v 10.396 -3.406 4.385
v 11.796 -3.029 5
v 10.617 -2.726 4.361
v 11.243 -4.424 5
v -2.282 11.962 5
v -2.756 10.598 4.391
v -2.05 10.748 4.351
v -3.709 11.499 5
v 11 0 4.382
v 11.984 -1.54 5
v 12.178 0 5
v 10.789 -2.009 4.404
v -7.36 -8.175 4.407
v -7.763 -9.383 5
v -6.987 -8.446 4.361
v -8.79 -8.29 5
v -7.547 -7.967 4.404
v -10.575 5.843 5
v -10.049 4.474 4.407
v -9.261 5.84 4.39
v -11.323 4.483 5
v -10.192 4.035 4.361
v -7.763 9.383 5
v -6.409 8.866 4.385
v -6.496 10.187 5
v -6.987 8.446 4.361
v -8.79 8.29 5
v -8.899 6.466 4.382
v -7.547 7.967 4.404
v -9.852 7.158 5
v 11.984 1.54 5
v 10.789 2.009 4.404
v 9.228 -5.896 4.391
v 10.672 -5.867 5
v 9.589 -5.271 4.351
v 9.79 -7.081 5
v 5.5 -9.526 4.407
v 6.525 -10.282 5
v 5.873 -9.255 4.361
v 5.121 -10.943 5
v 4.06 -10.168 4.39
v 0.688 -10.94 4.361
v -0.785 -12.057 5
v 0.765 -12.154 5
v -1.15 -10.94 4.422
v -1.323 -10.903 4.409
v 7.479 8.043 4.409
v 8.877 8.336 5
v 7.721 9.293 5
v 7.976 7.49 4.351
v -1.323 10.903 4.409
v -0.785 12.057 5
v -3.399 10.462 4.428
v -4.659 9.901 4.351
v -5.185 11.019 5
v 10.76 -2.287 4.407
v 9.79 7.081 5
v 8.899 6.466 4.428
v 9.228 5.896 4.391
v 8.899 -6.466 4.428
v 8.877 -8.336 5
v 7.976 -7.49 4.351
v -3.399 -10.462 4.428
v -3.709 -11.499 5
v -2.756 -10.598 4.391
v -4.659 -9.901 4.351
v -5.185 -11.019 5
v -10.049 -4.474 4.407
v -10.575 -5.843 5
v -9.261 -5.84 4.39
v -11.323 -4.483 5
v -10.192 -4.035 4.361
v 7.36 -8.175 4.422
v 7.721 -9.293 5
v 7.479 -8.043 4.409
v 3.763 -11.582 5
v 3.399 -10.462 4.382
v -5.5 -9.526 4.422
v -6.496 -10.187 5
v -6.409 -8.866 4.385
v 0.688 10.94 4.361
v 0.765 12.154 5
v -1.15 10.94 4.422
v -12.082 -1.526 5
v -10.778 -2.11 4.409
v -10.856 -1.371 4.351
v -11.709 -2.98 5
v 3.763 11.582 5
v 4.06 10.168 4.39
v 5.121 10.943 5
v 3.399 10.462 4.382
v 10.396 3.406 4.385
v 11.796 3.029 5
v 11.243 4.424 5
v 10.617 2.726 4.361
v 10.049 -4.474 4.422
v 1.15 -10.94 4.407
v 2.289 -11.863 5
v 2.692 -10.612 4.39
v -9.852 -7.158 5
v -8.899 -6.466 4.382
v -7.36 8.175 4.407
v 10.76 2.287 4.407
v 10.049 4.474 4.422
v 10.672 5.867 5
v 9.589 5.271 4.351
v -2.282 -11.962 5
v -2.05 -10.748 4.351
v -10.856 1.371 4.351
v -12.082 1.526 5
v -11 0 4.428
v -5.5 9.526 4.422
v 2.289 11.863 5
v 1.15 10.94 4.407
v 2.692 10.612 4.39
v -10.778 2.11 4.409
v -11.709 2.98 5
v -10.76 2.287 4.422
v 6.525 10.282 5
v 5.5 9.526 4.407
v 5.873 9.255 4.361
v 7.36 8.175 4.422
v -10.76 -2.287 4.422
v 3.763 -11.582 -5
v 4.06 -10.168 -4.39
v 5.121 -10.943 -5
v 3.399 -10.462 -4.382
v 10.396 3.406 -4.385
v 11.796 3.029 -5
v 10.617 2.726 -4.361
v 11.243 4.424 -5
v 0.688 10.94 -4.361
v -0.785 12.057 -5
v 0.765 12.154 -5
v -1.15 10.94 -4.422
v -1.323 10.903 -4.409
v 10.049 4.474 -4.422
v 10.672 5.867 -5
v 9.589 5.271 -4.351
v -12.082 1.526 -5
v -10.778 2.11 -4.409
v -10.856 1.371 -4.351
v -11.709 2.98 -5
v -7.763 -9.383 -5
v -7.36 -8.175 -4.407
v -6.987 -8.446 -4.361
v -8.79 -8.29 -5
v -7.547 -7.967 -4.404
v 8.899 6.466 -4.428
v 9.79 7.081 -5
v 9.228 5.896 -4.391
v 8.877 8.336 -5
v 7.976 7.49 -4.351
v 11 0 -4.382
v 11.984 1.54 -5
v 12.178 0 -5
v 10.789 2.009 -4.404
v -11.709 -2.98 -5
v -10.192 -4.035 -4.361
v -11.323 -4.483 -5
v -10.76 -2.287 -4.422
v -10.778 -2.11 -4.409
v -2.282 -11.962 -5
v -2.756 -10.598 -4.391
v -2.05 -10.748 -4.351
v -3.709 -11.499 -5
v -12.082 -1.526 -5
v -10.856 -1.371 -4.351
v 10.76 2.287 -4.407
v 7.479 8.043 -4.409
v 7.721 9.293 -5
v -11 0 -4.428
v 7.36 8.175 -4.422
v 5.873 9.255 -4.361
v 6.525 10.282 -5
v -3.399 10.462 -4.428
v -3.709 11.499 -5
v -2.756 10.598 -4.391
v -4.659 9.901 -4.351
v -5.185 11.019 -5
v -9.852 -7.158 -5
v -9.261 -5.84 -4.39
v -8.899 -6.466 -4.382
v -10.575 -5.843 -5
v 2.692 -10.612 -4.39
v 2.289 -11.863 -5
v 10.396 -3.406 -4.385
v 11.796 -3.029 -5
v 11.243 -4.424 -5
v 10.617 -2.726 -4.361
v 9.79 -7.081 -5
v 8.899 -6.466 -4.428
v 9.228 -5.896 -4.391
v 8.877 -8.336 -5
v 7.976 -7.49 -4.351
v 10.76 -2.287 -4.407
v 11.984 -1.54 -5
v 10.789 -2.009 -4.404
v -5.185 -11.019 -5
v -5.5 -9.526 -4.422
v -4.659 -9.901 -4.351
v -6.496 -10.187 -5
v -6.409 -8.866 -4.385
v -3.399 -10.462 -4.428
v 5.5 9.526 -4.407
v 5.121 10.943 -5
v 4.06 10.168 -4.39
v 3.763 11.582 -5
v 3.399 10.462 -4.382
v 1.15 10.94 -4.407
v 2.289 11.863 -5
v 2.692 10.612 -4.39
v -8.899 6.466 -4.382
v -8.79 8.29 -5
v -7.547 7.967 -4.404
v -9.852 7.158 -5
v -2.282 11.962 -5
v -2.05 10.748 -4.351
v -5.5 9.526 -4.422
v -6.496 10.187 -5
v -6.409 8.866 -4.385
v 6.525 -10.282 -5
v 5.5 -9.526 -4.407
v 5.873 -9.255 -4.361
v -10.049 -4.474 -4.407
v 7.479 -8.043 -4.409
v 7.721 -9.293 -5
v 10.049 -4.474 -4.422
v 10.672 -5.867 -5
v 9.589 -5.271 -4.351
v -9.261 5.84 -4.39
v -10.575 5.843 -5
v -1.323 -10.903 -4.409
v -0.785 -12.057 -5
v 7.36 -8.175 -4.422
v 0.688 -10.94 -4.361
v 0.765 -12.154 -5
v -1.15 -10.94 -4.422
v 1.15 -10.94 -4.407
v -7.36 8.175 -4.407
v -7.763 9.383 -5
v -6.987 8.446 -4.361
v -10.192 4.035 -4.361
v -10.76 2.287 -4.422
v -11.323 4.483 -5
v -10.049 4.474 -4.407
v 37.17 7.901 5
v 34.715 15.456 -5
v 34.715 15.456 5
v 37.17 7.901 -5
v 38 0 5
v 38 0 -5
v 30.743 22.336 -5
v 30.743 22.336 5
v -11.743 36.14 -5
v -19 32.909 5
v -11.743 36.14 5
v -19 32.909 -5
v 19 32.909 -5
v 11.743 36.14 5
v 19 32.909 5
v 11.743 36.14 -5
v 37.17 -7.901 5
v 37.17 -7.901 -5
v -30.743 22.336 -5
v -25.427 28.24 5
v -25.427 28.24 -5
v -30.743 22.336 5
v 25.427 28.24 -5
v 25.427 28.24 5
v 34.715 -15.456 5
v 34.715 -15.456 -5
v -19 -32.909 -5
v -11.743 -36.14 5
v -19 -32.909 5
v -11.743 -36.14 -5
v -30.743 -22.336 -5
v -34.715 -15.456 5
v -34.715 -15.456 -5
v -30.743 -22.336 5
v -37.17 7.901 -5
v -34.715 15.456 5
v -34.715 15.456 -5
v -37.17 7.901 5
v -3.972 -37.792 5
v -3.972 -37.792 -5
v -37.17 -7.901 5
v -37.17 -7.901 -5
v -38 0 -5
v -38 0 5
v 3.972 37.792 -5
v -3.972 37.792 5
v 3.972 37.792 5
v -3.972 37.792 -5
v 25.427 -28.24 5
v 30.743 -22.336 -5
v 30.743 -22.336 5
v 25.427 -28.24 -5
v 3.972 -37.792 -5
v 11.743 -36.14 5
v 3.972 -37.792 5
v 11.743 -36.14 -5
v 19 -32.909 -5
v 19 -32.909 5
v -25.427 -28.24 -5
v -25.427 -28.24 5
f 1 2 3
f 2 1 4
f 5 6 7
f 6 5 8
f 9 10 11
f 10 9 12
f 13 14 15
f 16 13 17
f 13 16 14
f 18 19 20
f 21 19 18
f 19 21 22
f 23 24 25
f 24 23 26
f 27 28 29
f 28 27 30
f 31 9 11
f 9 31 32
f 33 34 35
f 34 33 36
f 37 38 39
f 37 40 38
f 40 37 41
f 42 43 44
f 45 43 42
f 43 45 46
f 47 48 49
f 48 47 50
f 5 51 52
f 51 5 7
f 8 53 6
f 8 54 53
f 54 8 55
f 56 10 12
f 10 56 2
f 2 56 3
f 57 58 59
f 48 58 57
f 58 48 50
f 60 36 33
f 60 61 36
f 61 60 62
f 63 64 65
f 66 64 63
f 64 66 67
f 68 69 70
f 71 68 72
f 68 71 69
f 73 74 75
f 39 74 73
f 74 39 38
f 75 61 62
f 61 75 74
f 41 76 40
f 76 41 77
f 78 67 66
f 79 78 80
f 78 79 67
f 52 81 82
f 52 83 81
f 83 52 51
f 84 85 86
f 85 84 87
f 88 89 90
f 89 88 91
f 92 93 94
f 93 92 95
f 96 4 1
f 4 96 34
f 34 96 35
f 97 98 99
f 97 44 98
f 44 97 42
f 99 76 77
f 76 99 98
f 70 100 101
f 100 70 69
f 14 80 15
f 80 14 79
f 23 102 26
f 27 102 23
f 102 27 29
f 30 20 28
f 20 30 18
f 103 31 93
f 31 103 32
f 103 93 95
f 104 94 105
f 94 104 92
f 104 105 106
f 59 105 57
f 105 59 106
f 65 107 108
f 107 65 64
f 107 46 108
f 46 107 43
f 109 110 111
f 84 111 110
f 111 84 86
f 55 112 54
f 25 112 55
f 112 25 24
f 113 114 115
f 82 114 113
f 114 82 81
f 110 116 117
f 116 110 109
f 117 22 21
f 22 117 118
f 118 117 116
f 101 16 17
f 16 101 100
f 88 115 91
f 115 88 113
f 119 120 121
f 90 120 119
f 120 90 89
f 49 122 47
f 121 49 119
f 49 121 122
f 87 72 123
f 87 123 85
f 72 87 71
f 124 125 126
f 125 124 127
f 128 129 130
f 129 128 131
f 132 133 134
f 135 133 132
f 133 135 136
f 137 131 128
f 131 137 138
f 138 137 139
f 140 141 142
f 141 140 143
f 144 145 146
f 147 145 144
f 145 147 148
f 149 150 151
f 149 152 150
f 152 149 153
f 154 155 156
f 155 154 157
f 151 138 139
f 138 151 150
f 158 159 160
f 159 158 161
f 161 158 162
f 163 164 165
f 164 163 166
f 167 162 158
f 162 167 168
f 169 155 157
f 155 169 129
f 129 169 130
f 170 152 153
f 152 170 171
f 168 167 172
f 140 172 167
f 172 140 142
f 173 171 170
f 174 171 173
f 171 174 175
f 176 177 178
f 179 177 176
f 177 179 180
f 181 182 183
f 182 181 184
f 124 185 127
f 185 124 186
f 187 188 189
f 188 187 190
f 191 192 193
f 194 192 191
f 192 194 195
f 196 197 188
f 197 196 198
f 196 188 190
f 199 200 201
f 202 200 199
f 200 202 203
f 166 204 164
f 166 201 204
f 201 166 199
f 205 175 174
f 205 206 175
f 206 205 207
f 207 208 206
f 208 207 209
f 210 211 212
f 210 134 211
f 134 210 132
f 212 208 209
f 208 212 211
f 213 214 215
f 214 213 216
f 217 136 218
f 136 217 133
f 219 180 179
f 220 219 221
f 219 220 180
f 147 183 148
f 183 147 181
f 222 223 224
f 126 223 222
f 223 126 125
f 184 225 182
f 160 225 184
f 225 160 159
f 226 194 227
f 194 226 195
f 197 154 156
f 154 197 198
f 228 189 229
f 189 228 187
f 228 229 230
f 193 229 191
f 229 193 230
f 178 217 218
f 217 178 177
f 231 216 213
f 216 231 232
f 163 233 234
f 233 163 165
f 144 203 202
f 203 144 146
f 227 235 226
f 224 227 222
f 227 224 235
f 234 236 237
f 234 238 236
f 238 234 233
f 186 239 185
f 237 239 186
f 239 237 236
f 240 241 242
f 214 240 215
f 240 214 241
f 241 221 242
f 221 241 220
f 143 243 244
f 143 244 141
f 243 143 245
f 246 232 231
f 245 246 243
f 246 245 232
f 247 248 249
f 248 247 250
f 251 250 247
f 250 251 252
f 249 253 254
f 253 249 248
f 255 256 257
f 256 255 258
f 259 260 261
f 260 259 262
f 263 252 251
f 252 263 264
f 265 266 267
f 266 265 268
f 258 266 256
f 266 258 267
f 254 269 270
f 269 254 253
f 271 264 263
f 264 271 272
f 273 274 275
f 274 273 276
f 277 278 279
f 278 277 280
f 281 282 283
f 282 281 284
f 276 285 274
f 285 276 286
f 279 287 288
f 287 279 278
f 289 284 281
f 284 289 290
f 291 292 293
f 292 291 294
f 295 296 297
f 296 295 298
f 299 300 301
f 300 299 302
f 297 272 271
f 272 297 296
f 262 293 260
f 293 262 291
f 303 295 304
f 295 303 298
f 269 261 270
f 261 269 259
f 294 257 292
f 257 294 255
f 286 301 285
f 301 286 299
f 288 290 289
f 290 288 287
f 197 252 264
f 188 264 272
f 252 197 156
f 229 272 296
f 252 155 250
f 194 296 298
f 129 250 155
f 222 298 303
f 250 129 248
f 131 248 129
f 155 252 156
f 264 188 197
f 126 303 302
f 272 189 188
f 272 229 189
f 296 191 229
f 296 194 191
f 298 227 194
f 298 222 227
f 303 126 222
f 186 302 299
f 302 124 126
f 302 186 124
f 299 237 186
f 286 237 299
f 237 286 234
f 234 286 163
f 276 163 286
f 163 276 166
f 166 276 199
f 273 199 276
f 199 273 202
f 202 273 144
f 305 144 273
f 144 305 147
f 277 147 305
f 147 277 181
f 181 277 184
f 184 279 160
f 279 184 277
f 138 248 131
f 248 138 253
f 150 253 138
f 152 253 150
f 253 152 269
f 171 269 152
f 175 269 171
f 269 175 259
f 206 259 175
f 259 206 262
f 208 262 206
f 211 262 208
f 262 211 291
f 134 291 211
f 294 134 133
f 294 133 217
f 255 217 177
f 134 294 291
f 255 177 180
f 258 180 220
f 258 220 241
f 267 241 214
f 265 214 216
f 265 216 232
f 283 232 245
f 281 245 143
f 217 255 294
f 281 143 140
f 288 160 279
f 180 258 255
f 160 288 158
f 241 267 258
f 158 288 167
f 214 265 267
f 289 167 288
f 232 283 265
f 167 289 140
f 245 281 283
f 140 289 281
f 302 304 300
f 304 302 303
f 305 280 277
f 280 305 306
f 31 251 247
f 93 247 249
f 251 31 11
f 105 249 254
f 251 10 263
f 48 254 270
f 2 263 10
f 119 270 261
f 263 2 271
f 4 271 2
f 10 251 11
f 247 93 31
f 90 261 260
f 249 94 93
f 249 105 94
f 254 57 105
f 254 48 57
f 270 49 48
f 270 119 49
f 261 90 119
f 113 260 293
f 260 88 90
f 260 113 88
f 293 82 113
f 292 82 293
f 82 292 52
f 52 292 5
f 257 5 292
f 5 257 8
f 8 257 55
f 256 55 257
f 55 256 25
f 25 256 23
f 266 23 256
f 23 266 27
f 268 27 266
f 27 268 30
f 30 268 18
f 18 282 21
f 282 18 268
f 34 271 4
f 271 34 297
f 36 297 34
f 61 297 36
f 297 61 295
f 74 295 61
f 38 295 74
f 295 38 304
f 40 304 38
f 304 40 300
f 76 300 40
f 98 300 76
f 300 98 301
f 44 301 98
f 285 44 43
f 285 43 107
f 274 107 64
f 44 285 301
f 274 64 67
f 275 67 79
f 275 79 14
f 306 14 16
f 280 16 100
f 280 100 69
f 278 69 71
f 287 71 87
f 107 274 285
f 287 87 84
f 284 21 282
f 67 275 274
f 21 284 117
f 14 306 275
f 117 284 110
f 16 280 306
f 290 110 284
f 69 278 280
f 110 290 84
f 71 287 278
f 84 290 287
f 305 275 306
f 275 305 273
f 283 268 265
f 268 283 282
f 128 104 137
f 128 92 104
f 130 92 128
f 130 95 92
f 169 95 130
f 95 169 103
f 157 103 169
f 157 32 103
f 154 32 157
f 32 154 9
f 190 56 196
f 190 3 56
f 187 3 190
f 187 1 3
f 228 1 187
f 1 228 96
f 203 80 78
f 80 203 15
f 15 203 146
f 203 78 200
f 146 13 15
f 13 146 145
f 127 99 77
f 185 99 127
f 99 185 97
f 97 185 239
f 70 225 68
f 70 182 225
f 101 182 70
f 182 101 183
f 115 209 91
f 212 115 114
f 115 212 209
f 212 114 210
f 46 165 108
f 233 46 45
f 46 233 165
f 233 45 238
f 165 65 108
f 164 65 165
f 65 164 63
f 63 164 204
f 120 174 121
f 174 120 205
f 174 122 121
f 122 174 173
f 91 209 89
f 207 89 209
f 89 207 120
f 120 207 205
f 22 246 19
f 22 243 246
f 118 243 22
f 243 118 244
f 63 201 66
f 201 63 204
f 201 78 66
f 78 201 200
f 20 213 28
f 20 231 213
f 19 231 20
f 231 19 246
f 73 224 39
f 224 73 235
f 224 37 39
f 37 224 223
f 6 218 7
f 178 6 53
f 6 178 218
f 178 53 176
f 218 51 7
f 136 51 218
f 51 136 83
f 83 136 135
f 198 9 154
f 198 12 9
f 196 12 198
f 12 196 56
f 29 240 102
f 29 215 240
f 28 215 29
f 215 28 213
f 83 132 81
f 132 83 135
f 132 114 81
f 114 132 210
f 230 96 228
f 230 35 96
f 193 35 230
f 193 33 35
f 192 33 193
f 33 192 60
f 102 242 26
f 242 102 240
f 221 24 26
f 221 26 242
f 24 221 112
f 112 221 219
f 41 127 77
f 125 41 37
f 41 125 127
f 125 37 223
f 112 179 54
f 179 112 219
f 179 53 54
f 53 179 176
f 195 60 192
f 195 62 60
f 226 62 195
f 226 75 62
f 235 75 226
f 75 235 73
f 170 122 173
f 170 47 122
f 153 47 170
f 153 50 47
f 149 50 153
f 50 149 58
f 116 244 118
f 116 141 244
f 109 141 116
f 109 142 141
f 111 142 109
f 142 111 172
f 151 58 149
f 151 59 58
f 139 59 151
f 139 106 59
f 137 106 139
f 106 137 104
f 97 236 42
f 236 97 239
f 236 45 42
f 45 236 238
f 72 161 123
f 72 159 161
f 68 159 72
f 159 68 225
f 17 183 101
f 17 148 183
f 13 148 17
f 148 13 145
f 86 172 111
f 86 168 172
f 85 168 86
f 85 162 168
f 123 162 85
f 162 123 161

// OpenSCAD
/* [Dimensions of the Spinner] */
// Outer Diameter
sOuterDiameter = 76;
// Outer thickness
sOuterThickness = 10;

/* [Dimensions of the Main Bearing] */
// Outer Diameter
mBOuterDiameter = 22;
// Outer thickness (same as outer thickness of the spinner, exept if you active the edgeless property)
mBOuterThickness = 7;
// Active the edgeless property
mBActiveEdgeless = true; // [true:Yes, false:No]
// Height of the sphere (for edgeless)
mBHeightEdgelessSphere = 30;
// Radius of the sphere (for edgeless)
mBRadiusEdgelessSphere = 28;
// Precision of the sphere (for edgeless)
mBPrecisionEdgelessSphere = 25;

fudge = 0.1;

difference ()
{
    color("red")
    cylinder(h=sOuterThickness, d=sOuterDiameter, center=true);
    
    cylinder(h=sOuterThickness+2*fudge, d=mBOuterDiameter, center=true);
    
    if (mBActiveEdgeless)
    {
        translate([0,0,mBHeightEdgelessSphere])
        sphere(r=mBRadiusEdgelessSphere, $fn=mBPrecisionEdgelessSphere);
        
        translate([0,0,-mBHeightEdgelessSphere])
        sphere(r=mBRadiusEdgelessSphere, $fn=mBPrecisionEdgelessSphere);
    }
}
